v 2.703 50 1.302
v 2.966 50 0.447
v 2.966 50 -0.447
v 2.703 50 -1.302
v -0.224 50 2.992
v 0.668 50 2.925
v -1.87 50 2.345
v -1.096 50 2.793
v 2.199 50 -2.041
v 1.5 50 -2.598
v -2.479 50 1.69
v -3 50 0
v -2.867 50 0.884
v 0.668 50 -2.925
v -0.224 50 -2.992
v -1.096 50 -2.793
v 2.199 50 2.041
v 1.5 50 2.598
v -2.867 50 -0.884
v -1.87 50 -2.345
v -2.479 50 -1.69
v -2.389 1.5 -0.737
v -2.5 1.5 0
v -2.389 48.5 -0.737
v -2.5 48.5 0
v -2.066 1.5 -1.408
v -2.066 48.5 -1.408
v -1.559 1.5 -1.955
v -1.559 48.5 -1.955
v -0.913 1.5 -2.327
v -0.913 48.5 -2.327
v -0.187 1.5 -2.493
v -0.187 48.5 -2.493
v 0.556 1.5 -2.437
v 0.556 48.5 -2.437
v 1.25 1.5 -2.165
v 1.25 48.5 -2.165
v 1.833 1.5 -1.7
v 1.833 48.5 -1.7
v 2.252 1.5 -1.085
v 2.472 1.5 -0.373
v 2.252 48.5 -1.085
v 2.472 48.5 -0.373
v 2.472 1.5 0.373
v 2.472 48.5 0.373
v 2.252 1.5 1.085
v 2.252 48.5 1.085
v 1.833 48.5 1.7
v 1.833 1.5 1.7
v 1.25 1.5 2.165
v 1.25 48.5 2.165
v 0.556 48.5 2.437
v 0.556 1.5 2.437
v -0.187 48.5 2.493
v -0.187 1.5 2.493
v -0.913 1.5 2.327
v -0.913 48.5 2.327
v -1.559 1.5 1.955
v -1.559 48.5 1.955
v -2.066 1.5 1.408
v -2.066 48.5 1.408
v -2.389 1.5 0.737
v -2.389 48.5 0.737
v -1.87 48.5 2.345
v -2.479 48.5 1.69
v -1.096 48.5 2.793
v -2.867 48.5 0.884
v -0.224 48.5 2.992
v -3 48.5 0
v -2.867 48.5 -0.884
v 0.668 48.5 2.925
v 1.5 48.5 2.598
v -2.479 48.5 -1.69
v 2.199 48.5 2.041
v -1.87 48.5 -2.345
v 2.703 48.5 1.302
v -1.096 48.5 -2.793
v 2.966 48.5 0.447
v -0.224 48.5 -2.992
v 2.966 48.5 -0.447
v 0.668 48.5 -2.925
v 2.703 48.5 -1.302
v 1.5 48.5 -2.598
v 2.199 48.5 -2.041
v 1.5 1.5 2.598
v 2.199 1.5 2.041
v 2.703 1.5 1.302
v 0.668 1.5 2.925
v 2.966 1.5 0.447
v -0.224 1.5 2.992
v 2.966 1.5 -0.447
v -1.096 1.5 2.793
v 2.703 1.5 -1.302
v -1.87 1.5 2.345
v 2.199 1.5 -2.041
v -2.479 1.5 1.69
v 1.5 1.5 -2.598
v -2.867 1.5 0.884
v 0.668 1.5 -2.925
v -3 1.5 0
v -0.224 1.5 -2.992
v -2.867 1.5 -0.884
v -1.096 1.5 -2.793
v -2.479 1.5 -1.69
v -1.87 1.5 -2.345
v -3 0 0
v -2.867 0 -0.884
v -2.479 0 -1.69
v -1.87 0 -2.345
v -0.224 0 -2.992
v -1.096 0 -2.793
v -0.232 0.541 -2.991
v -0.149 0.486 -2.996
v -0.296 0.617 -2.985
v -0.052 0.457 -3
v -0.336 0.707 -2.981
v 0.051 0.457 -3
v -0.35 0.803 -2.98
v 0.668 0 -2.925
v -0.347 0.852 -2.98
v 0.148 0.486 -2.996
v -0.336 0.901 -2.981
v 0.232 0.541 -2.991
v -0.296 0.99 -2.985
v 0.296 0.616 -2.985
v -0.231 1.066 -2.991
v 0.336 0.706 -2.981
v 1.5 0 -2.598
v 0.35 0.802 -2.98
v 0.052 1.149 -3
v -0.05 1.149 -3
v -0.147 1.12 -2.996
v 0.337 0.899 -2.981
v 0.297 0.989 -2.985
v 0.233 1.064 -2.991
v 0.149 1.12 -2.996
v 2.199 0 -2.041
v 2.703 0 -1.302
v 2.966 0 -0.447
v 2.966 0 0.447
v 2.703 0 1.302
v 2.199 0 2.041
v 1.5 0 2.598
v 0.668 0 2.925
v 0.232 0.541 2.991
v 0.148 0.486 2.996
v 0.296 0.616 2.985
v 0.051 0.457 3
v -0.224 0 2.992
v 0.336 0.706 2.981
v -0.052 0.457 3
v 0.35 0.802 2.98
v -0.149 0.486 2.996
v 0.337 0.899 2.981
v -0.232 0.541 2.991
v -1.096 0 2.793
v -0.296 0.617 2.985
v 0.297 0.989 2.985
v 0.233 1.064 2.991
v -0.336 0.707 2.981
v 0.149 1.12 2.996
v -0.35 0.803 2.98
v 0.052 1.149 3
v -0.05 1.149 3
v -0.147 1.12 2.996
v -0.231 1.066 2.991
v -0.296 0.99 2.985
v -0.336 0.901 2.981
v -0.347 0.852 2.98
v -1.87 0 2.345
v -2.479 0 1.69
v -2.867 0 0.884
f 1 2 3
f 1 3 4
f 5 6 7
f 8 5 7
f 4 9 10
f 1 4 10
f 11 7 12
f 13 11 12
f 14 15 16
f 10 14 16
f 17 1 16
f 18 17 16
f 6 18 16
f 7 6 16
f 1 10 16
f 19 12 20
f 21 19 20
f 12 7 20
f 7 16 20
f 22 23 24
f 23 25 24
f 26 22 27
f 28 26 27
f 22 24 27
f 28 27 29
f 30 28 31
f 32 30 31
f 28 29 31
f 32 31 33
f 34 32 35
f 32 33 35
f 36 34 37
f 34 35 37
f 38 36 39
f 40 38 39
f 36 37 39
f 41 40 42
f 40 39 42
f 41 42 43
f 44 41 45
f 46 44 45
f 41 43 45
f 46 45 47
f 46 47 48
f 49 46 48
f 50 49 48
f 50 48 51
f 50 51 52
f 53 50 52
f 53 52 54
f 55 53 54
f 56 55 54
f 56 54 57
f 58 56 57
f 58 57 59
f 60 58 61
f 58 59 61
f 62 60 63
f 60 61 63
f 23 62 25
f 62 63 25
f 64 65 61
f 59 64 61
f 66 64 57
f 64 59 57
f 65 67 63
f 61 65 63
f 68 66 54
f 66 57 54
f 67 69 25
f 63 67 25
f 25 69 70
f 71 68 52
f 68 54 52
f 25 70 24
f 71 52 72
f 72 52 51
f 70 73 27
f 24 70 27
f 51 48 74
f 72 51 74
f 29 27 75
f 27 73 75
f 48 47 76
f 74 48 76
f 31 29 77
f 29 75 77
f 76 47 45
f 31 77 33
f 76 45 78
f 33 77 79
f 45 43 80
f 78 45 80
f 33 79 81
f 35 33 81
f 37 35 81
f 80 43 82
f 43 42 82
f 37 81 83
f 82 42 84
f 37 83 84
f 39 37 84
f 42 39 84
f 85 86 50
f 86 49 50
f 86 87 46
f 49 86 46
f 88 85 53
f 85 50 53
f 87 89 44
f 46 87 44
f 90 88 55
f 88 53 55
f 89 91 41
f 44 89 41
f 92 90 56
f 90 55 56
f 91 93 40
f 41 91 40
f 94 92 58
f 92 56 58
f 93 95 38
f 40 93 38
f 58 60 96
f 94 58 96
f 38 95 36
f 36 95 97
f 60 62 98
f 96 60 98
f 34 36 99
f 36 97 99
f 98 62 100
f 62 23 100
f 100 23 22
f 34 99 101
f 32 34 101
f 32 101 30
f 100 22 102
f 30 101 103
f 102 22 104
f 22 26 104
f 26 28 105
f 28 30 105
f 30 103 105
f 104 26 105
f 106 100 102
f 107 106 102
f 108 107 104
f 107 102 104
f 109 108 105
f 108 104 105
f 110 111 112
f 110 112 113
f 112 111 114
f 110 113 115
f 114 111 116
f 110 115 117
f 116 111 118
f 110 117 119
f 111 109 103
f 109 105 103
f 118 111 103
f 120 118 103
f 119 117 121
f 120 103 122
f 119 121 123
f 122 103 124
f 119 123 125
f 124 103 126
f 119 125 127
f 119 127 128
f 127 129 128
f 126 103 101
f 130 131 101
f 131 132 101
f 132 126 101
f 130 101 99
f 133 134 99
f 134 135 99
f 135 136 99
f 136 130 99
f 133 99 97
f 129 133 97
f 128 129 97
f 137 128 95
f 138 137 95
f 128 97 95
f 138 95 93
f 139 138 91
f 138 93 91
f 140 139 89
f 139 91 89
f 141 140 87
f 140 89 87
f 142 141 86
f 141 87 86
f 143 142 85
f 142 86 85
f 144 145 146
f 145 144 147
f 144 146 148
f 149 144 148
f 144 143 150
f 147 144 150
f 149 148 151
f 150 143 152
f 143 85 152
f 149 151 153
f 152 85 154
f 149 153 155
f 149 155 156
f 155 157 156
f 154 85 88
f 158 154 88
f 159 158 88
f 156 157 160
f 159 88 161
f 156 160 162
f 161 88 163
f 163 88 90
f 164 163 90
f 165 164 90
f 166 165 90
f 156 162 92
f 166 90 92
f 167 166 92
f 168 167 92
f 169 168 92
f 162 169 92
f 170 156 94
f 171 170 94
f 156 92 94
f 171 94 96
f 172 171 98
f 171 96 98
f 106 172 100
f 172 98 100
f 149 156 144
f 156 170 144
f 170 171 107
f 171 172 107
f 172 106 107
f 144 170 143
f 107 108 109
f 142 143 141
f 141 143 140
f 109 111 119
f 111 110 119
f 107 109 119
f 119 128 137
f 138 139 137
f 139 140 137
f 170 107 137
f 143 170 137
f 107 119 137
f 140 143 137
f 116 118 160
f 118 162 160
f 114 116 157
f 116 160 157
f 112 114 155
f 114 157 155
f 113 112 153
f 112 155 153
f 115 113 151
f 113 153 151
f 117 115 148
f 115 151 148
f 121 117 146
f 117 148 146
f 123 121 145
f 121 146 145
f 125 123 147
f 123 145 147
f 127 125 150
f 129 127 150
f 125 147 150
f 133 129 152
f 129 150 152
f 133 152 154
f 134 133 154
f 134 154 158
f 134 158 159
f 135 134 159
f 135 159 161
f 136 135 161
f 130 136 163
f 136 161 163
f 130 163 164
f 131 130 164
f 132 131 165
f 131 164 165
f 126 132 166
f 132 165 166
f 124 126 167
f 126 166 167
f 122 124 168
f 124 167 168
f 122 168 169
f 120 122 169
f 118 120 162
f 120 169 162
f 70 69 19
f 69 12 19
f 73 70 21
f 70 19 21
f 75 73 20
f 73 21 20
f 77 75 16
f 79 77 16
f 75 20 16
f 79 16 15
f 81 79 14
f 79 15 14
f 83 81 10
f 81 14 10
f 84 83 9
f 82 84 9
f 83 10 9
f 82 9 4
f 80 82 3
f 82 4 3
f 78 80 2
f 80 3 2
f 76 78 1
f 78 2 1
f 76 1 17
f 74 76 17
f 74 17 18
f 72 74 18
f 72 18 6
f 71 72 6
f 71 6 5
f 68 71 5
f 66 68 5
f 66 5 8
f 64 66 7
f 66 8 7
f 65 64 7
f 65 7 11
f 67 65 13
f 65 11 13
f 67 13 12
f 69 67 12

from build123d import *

# Parameters (mm, degrees)
SKETCH2_R          = 0.35
CUT_EXTRUDE1_DEPTH = 5


with BuildPart() as part:
    # Sketch1 → Revolve1 (revolve)
    with BuildSketch(Plane.XY, mode=Mode.PRIVATE) as revolve1_sk:
        Polygon((0, 0), (3, 0), (3, 1.5), (2.5, 1.5), (2.5, 48.5), (3, 48.5), (3, 50), (0, 50), align=None)
    revolve(revolve1_sk.sketch.rotate(Axis((0, 50, 0), (0, -1, 0)), 180), axis=Axis((0, 50, 0), (0, -1, 0)))

    # Sketch2 → Cut-Extrude1 (cut, symmetric)
    with BuildSketch(Plane.XY):
        with Locations(Location((0, 0.802923523, 0), (0, 0, 180))):
            Circle(SKETCH2_R)
    extrude(amount=CUT_EXTRUDE1_DEPTH, both=True, mode=Mode.SUBTRACT)


solid = part.part
